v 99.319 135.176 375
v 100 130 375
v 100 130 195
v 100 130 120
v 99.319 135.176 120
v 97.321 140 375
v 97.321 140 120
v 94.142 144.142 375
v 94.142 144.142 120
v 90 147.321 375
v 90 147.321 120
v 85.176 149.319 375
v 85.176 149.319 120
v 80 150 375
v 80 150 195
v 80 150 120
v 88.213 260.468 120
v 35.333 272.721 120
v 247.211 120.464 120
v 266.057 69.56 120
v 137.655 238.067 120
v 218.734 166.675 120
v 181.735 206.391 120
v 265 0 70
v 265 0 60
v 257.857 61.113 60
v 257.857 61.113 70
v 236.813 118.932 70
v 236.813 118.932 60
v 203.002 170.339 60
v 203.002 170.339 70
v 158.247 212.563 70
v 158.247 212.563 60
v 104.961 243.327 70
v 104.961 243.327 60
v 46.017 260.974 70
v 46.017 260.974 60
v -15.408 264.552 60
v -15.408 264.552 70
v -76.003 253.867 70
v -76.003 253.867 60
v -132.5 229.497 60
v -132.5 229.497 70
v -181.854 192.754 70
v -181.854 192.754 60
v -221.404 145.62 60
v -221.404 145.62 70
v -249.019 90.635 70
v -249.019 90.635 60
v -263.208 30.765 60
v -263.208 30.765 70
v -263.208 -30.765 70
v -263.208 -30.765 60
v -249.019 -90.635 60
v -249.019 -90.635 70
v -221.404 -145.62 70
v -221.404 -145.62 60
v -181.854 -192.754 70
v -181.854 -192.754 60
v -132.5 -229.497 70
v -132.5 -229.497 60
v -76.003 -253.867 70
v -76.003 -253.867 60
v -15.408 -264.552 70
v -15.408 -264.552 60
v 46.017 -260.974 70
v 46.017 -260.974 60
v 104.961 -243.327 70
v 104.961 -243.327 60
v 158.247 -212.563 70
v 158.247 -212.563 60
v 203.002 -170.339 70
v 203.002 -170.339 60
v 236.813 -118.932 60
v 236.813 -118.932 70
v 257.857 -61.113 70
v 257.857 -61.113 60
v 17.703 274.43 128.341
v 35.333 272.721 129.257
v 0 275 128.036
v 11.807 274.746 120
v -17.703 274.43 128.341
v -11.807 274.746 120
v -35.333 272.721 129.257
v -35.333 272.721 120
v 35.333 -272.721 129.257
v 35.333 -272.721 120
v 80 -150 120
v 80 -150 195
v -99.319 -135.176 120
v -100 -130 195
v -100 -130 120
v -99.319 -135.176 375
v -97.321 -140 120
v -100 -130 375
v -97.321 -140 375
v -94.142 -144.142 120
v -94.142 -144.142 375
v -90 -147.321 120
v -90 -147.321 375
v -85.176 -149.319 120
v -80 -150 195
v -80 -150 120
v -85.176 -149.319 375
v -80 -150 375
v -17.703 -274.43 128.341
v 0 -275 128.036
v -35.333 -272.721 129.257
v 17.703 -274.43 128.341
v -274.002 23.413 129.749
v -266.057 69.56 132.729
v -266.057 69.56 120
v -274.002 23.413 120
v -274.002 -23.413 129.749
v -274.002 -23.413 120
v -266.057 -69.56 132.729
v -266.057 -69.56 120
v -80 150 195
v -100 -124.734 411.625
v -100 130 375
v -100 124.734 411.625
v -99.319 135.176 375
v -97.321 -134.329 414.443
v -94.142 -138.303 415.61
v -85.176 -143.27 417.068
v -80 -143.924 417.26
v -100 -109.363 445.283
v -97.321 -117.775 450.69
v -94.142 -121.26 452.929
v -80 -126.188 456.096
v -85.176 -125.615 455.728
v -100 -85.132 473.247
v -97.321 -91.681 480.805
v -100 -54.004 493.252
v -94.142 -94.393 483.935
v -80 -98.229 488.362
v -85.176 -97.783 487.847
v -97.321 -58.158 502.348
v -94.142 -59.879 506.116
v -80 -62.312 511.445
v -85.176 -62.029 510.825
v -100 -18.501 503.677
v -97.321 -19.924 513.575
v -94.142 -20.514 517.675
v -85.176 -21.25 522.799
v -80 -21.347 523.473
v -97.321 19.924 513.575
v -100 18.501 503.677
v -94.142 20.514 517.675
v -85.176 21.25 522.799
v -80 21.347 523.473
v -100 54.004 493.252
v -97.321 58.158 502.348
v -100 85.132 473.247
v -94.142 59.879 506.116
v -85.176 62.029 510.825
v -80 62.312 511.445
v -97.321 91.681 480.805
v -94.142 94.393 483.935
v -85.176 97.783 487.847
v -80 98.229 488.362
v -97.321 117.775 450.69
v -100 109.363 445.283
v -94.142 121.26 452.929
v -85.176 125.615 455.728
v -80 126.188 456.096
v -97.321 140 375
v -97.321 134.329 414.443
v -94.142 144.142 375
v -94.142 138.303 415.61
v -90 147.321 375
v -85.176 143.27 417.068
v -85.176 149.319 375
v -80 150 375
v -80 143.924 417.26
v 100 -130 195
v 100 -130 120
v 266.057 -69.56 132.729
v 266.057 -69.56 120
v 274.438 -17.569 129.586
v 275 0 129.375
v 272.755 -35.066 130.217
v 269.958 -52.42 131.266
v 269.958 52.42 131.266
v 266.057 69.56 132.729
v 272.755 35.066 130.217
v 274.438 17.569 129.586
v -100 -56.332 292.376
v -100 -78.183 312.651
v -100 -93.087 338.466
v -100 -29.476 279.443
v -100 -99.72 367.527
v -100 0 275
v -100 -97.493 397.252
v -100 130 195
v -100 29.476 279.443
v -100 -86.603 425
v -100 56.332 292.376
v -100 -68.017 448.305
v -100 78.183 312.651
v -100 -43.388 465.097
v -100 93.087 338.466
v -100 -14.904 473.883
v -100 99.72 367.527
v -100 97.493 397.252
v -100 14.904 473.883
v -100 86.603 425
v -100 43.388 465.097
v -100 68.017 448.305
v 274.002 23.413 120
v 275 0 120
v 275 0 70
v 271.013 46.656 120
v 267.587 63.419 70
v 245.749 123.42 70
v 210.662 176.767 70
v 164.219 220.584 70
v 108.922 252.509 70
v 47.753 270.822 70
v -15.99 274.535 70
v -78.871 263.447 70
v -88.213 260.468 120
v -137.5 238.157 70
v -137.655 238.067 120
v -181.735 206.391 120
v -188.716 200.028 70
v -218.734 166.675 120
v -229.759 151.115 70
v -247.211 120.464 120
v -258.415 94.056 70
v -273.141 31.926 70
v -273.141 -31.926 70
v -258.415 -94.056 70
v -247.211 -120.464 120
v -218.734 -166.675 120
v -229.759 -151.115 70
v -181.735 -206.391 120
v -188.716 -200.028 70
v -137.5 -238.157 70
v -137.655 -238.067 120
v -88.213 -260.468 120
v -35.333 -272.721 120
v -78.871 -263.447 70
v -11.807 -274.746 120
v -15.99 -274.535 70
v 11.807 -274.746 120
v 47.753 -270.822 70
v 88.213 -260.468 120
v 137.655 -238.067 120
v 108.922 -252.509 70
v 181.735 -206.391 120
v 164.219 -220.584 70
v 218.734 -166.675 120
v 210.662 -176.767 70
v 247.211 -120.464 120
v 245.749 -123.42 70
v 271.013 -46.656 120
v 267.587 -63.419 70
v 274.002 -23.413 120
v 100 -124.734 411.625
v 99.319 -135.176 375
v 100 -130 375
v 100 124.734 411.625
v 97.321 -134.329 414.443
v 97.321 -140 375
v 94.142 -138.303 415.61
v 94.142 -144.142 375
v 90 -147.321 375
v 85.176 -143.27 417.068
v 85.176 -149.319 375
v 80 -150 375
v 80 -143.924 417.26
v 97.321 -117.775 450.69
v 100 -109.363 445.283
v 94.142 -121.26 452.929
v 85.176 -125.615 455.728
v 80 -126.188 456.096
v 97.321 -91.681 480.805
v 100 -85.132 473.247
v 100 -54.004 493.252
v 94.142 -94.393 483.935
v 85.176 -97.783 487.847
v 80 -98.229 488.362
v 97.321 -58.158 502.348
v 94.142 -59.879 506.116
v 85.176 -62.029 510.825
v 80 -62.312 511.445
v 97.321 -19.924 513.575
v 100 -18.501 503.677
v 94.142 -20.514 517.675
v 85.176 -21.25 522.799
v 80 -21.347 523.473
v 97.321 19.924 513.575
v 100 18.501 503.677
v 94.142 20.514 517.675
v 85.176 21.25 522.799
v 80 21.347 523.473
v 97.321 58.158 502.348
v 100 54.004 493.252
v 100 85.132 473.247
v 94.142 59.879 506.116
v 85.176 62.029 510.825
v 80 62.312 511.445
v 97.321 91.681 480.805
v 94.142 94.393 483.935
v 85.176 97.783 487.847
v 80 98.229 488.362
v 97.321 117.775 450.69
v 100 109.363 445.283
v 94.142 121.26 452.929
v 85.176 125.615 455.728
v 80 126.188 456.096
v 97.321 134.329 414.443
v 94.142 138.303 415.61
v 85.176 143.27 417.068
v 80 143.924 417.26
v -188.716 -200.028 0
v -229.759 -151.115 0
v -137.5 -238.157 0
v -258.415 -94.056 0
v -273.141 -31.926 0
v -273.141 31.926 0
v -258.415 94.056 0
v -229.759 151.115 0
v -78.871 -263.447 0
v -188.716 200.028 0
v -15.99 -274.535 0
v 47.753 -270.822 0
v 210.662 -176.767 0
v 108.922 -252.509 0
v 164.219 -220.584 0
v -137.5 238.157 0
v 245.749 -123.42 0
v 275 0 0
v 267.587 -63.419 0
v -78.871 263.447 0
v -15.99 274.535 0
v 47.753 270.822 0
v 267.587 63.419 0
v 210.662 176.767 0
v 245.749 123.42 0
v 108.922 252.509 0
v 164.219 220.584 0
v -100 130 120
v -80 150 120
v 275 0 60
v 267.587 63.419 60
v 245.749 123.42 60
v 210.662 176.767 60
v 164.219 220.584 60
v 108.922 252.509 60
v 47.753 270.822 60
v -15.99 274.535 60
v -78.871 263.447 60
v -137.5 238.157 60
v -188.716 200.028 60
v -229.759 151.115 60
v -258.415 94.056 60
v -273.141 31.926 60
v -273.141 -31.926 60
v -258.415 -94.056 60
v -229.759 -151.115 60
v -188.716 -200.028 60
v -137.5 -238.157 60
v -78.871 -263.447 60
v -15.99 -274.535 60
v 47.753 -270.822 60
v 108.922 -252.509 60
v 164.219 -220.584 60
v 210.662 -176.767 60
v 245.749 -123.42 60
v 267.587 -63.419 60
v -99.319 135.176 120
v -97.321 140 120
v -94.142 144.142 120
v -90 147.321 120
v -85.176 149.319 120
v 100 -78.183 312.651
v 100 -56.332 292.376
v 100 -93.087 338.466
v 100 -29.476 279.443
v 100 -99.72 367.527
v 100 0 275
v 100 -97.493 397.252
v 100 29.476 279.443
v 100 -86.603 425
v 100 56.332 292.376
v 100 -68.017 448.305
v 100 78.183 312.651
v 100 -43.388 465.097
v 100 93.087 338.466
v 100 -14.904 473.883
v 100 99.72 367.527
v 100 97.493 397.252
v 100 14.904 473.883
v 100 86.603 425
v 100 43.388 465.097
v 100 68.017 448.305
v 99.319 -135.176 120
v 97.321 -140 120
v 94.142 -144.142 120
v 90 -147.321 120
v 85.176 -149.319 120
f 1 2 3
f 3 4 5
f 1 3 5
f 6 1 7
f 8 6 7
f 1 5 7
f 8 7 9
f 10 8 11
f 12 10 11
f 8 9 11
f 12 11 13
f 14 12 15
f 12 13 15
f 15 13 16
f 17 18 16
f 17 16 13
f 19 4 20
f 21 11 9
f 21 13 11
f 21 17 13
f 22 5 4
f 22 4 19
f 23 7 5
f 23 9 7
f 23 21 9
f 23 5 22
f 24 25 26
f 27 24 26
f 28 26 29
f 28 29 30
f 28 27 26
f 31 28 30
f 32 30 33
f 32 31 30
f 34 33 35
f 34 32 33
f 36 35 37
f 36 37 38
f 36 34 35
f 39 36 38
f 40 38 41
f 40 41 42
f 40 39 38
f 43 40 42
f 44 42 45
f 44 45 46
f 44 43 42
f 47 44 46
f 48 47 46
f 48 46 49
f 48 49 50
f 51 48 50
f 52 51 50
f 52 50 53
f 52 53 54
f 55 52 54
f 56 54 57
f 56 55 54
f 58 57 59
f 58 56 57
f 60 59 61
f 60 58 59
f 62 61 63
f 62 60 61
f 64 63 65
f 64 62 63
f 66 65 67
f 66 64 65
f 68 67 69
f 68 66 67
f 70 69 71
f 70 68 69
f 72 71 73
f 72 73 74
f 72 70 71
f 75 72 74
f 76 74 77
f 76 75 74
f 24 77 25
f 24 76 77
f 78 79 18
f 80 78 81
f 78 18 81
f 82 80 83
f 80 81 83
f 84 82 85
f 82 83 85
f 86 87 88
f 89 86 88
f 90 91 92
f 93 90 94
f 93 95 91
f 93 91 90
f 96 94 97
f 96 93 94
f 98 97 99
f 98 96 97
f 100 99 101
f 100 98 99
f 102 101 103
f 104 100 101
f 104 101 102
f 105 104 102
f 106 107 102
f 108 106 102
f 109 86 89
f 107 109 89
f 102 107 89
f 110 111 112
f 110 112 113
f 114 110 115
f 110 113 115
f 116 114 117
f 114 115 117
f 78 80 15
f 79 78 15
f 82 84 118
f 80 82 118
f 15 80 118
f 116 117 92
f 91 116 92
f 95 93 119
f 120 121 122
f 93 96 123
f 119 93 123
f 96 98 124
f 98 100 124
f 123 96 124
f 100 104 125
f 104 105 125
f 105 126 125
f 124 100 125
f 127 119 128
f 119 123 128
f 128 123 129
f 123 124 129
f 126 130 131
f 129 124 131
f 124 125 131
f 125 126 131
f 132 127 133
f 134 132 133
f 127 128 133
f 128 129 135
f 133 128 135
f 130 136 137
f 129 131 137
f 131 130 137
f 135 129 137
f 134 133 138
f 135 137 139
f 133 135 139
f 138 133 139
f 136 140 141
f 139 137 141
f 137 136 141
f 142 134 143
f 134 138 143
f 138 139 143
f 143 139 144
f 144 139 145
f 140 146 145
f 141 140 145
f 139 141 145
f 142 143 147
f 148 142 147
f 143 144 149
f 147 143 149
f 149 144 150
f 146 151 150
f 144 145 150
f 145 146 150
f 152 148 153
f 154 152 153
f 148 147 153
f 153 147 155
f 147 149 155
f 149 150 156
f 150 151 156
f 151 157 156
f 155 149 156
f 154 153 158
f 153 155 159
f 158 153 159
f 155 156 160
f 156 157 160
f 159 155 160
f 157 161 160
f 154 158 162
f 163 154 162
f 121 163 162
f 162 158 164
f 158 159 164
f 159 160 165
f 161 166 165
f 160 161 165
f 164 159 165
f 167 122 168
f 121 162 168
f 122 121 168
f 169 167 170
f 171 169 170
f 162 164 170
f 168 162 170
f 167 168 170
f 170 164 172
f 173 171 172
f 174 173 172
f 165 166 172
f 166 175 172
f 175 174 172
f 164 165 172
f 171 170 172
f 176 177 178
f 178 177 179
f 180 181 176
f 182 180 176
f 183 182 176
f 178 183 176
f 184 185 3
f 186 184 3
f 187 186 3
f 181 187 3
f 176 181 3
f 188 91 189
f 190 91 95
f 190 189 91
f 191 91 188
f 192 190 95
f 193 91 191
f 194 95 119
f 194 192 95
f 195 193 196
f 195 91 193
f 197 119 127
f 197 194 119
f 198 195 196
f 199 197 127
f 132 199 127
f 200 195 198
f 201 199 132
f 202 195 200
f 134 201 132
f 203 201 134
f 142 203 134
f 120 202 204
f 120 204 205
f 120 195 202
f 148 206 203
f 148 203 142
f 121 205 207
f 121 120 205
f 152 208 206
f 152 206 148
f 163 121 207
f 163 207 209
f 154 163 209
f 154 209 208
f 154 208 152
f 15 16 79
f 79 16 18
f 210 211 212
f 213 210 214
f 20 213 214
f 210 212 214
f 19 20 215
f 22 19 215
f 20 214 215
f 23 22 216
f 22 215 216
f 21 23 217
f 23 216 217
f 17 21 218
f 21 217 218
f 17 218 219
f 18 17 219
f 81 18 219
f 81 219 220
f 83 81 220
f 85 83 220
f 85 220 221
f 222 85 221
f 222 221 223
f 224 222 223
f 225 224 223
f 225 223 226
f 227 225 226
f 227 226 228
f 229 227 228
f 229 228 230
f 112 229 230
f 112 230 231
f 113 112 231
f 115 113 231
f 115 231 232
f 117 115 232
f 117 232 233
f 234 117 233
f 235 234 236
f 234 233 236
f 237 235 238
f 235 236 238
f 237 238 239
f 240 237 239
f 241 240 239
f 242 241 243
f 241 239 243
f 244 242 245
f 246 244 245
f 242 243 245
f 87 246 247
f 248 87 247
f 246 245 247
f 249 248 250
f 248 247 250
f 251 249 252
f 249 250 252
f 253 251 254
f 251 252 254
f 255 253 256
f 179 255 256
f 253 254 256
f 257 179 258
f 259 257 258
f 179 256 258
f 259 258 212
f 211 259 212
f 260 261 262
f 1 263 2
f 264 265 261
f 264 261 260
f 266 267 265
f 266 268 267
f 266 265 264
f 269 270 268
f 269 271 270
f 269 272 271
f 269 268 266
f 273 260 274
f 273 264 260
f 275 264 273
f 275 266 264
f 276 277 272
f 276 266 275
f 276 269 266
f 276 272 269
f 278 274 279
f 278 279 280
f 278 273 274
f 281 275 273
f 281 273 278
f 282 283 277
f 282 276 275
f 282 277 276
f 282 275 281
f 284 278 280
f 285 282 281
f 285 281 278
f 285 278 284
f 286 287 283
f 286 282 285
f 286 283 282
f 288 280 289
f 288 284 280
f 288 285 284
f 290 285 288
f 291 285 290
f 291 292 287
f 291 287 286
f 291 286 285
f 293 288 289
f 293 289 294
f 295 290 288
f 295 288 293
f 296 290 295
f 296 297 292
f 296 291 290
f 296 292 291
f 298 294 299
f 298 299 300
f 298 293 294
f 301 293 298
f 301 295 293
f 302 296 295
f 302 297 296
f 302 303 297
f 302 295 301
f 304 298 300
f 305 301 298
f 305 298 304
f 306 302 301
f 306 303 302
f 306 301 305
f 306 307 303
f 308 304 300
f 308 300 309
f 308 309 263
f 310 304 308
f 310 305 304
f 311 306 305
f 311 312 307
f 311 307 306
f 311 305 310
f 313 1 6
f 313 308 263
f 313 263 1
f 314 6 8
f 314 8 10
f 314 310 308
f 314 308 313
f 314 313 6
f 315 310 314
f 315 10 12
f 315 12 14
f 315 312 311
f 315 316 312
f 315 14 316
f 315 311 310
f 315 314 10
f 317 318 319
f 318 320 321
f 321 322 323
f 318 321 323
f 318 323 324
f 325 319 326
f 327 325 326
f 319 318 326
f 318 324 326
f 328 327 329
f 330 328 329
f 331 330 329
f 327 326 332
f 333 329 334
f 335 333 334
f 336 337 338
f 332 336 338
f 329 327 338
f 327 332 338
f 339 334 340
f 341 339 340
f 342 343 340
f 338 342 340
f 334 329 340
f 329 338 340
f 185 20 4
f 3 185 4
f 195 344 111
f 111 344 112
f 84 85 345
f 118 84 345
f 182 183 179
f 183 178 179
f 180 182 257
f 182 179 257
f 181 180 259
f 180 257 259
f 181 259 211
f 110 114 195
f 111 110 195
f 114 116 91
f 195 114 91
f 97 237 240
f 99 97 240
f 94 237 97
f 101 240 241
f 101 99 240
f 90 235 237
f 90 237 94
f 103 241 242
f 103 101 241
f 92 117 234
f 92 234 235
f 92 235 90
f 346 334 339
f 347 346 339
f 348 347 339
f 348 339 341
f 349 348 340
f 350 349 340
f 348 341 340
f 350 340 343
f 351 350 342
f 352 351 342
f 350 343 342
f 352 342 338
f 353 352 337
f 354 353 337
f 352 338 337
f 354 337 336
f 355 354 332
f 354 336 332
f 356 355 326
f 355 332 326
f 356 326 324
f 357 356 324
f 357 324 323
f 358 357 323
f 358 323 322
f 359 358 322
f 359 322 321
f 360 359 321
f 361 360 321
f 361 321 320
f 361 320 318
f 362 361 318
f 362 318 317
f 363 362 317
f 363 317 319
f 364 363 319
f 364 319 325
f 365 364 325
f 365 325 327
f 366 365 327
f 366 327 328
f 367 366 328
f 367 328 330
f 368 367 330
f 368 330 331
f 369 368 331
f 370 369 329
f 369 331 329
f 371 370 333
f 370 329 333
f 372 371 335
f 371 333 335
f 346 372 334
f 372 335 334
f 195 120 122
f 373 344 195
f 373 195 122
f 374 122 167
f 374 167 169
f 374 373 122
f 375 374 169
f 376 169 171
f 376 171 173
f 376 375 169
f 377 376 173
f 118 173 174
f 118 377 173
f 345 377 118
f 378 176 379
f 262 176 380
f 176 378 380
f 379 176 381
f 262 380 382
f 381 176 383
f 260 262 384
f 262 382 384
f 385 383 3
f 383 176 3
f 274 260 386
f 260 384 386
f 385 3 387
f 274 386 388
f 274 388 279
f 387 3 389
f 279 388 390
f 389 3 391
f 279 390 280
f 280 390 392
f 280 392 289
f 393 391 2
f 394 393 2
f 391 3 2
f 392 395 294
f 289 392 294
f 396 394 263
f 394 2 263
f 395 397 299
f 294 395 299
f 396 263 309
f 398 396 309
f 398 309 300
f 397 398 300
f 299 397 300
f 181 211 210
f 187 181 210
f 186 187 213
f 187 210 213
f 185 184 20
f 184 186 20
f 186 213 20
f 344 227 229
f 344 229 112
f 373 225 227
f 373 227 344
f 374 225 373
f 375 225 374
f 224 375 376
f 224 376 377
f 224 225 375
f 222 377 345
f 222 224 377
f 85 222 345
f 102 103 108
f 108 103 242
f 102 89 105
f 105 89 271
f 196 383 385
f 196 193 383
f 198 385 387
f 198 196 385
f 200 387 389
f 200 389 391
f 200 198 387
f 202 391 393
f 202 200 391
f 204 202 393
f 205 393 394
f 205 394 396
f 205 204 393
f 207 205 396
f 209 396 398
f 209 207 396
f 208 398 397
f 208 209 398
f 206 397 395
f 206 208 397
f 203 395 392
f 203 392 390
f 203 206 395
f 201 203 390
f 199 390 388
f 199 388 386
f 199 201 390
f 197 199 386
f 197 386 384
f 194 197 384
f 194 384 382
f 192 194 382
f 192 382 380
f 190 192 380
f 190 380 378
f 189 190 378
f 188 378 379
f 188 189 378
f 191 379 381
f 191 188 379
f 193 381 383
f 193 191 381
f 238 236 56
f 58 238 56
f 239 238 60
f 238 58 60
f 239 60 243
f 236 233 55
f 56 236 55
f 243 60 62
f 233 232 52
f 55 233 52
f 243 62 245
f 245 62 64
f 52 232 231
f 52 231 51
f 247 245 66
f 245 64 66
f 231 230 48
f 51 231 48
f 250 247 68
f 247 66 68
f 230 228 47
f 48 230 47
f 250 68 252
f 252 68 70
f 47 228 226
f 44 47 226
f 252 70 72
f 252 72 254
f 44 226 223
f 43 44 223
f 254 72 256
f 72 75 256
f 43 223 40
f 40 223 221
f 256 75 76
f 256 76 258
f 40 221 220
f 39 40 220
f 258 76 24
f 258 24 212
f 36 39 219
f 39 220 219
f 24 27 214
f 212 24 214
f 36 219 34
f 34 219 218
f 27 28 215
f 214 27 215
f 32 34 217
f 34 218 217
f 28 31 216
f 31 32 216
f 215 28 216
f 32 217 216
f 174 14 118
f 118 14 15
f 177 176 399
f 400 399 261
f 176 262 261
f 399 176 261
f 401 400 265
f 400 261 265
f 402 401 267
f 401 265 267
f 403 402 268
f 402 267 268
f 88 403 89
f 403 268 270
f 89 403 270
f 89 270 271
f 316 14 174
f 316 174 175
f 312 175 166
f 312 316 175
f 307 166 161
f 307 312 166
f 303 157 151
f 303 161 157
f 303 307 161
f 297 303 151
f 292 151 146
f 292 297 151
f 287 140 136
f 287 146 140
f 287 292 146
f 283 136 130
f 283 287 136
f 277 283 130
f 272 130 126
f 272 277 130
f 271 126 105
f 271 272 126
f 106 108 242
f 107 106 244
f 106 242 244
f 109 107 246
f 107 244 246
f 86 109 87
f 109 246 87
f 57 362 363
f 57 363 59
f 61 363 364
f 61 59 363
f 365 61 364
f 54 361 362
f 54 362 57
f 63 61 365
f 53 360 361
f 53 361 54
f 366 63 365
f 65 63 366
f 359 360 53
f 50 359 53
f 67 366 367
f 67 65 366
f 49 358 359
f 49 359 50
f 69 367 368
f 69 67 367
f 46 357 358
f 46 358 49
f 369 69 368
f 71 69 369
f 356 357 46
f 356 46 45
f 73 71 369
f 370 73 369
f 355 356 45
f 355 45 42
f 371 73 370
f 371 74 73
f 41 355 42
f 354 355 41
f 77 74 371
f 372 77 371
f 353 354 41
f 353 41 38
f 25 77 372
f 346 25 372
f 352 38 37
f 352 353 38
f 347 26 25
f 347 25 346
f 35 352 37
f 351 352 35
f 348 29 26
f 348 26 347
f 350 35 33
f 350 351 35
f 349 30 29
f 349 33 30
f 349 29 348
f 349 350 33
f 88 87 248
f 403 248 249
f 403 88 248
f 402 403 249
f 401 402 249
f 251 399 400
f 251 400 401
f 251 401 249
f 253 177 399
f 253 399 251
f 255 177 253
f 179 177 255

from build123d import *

# Parameters (mm, degrees)
SKETCH1_R           = 275
BOSS_EXTRUDE1_DEPTH = 70
SKETCH2_R           = 275
SKETCH2_R_2         = 265
CUT_EXTRUDE1_DEPTH  = 10
SKETCH3_R           = 275
BOSS_EXTRUDE2_DEPTH = 50
SKETCH4_R           = 150
SKETCH4_R_2         = 100
BOSS_EXTRUDE3_DEPTH = 100
BOSS_EXTRUDE4_DEPTH = 100
FILLET3_R           = 20
BOSS_EXTRUDE5_DEPTH = 75
CUT_EXTRUDE4_DEPTH  = 150
CUT_EXTRUDE5_DEPTH  = 87.5


with BuildPart() as part:
    # Sketch1 → Boss-Extrude1 (new body)
    with BuildSketch(Plane.XY):
        Circle(SKETCH1_R)
    extrude(amount=BOSS_EXTRUDE1_DEPTH)

    # Sketch2 → Cut-Extrude1 (cut)
    with BuildSketch(Plane.XY.offset(70)):
        Circle(SKETCH2_R)
        Circle(SKETCH2_R_2, mode=Mode.SUBTRACT)
    extrude(amount=-CUT_EXTRUDE1_DEPTH, mode=Mode.SUBTRACT)

    # Sketch3 → Boss-Extrude2 (add)
    with BuildSketch(Plane.XY.offset(70)):
        Circle(SKETCH3_R)
    extrude(amount=BOSS_EXTRUDE2_DEPTH)



with BuildPart() as body_2:
    # Sketch4 → Boss-Extrude3 (new body, symmetric)
    with BuildSketch(Plane(origin=(0, 0, 0), x_dir=(0, 0, -1), z_dir=(1, 0, 0))):
        with Locations((-375, 0)):
            Circle(SKETCH4_R)
        with Locations((-375, 0)):
            Circle(SKETCH4_R_2, mode=Mode.SUBTRACT)
    extrude(amount=BOSS_EXTRUDE3_DEPTH, both=True)


with BuildPart() as part_1:
    add(part.part)

    add(body_2.part)  # Boss-Extrude4 merges body 2
    # Sketch6 → Boss-Extrude4 (add, symmetric)
    with BuildSketch(Plane(origin=(0, 0, 0), x_dir=(0, 0, -1), z_dir=(1, 0, 0))):
        with BuildLine():
            Line((-375, 150), (-120, 150))
            Line((-120, 150), (-120, -150))
            Line((-120, -150), (-375, -150))
            ThreePointArc((-375, -150), (-225, 0), (-375, 150))
        make_face()
    extrude(amount=BOSS_EXTRUDE4_DEPTH, both=True)

    # Fillet3
    fillet3_edges = [part_1.edges().sort_by_distance(p)[0] for p in [
        (-100, -150, 247.5),
        (-100, 150, 247.5),
        (100, -150, 247.5),
        (100, 150, 247.5),
        (-100, 0, 525),
        (100, 0, 525),
    ]]
    fillet(fillet3_edges, radius=FILLET3_R)

    # Sketch7 → Boss-Extrude5 (add)
    with BuildSketch(Plane.XY.offset(120)):
        with BuildLine():
            ThreePointArc((-266.057108103, 69.560155462), (-275, 0), (-266.057108103, -69.560155462))
            Line((-266.057108103, -69.560155462), (-100, -130))
            Line((-100, -130), (-100, 130))
            Line((-100, 130), (-266.057108103, 69.560155462))
        make_face()
        with BuildLine():
            Line((100, -130), (266.057108103, -69.560155462))
            ThreePointArc((266.057108103, -69.560155462), (272.755114277, -35.066331942), (275, 0))
            ThreePointArc((275, 0), (272.755114277, 35.066331942), (266.057108103, 69.560155462))
            Line((266.057108103, 69.560155462), (100, 130))
            Line((100, 130), (100, -130))
        make_face()
        with BuildLine():
            ThreePointArc((35.333334581, 272.72065464), (0, 275), (-35.333334581, 272.72065464))
            Line((-35.333334581, 272.72065464), (-80, 150))
            Line((-80, 150), (80, 150))
            Line((80, 150), (35.333334581, 272.72065464))
        make_face()
        with BuildLine():
            Line((80, -150), (-80, -150))
            Line((-80, -150), (-35.333334581, -272.72065464))
            ThreePointArc((-35.333334581, -272.72065464), (0, -275), (35.333334581, -272.72065464))
            Line((35.333334581, -272.72065464), (80, -150))
        make_face()
    extrude(amount=BOSS_EXTRUDE5_DEPTH)

    # Sketch8 → Cut-Extrude4 (cut, symmetric)
    with BuildSketch(Plane(origin=(0, 0, 0), x_dir=(1, 0, 0), z_dir=(0, 1, 0))):
        Polygon((-300, -120), (-100, -195), (-300, -195), align=None)
        Polygon((300, -120), (100, -195), (300, -195), align=None)
    extrude(amount=CUT_EXTRUDE4_DEPTH, both=True, mode=Mode.SUBTRACT)

    # Sketch9 → Cut-Extrude5 (cut, symmetric)
    with BuildSketch(Plane(origin=(0, 0, 0), x_dir=(0, 0, -1), z_dir=(1, 0, 0))):
        Polygon((-195, 150), (-195, 290), (-120, 290), align=None)
        Polygon((-120, -290), (-195, -150), (-195, -290), align=None)
    extrude(amount=CUT_EXTRUDE5_DEPTH, both=True, mode=Mode.SUBTRACT)


solid = part_1.part
